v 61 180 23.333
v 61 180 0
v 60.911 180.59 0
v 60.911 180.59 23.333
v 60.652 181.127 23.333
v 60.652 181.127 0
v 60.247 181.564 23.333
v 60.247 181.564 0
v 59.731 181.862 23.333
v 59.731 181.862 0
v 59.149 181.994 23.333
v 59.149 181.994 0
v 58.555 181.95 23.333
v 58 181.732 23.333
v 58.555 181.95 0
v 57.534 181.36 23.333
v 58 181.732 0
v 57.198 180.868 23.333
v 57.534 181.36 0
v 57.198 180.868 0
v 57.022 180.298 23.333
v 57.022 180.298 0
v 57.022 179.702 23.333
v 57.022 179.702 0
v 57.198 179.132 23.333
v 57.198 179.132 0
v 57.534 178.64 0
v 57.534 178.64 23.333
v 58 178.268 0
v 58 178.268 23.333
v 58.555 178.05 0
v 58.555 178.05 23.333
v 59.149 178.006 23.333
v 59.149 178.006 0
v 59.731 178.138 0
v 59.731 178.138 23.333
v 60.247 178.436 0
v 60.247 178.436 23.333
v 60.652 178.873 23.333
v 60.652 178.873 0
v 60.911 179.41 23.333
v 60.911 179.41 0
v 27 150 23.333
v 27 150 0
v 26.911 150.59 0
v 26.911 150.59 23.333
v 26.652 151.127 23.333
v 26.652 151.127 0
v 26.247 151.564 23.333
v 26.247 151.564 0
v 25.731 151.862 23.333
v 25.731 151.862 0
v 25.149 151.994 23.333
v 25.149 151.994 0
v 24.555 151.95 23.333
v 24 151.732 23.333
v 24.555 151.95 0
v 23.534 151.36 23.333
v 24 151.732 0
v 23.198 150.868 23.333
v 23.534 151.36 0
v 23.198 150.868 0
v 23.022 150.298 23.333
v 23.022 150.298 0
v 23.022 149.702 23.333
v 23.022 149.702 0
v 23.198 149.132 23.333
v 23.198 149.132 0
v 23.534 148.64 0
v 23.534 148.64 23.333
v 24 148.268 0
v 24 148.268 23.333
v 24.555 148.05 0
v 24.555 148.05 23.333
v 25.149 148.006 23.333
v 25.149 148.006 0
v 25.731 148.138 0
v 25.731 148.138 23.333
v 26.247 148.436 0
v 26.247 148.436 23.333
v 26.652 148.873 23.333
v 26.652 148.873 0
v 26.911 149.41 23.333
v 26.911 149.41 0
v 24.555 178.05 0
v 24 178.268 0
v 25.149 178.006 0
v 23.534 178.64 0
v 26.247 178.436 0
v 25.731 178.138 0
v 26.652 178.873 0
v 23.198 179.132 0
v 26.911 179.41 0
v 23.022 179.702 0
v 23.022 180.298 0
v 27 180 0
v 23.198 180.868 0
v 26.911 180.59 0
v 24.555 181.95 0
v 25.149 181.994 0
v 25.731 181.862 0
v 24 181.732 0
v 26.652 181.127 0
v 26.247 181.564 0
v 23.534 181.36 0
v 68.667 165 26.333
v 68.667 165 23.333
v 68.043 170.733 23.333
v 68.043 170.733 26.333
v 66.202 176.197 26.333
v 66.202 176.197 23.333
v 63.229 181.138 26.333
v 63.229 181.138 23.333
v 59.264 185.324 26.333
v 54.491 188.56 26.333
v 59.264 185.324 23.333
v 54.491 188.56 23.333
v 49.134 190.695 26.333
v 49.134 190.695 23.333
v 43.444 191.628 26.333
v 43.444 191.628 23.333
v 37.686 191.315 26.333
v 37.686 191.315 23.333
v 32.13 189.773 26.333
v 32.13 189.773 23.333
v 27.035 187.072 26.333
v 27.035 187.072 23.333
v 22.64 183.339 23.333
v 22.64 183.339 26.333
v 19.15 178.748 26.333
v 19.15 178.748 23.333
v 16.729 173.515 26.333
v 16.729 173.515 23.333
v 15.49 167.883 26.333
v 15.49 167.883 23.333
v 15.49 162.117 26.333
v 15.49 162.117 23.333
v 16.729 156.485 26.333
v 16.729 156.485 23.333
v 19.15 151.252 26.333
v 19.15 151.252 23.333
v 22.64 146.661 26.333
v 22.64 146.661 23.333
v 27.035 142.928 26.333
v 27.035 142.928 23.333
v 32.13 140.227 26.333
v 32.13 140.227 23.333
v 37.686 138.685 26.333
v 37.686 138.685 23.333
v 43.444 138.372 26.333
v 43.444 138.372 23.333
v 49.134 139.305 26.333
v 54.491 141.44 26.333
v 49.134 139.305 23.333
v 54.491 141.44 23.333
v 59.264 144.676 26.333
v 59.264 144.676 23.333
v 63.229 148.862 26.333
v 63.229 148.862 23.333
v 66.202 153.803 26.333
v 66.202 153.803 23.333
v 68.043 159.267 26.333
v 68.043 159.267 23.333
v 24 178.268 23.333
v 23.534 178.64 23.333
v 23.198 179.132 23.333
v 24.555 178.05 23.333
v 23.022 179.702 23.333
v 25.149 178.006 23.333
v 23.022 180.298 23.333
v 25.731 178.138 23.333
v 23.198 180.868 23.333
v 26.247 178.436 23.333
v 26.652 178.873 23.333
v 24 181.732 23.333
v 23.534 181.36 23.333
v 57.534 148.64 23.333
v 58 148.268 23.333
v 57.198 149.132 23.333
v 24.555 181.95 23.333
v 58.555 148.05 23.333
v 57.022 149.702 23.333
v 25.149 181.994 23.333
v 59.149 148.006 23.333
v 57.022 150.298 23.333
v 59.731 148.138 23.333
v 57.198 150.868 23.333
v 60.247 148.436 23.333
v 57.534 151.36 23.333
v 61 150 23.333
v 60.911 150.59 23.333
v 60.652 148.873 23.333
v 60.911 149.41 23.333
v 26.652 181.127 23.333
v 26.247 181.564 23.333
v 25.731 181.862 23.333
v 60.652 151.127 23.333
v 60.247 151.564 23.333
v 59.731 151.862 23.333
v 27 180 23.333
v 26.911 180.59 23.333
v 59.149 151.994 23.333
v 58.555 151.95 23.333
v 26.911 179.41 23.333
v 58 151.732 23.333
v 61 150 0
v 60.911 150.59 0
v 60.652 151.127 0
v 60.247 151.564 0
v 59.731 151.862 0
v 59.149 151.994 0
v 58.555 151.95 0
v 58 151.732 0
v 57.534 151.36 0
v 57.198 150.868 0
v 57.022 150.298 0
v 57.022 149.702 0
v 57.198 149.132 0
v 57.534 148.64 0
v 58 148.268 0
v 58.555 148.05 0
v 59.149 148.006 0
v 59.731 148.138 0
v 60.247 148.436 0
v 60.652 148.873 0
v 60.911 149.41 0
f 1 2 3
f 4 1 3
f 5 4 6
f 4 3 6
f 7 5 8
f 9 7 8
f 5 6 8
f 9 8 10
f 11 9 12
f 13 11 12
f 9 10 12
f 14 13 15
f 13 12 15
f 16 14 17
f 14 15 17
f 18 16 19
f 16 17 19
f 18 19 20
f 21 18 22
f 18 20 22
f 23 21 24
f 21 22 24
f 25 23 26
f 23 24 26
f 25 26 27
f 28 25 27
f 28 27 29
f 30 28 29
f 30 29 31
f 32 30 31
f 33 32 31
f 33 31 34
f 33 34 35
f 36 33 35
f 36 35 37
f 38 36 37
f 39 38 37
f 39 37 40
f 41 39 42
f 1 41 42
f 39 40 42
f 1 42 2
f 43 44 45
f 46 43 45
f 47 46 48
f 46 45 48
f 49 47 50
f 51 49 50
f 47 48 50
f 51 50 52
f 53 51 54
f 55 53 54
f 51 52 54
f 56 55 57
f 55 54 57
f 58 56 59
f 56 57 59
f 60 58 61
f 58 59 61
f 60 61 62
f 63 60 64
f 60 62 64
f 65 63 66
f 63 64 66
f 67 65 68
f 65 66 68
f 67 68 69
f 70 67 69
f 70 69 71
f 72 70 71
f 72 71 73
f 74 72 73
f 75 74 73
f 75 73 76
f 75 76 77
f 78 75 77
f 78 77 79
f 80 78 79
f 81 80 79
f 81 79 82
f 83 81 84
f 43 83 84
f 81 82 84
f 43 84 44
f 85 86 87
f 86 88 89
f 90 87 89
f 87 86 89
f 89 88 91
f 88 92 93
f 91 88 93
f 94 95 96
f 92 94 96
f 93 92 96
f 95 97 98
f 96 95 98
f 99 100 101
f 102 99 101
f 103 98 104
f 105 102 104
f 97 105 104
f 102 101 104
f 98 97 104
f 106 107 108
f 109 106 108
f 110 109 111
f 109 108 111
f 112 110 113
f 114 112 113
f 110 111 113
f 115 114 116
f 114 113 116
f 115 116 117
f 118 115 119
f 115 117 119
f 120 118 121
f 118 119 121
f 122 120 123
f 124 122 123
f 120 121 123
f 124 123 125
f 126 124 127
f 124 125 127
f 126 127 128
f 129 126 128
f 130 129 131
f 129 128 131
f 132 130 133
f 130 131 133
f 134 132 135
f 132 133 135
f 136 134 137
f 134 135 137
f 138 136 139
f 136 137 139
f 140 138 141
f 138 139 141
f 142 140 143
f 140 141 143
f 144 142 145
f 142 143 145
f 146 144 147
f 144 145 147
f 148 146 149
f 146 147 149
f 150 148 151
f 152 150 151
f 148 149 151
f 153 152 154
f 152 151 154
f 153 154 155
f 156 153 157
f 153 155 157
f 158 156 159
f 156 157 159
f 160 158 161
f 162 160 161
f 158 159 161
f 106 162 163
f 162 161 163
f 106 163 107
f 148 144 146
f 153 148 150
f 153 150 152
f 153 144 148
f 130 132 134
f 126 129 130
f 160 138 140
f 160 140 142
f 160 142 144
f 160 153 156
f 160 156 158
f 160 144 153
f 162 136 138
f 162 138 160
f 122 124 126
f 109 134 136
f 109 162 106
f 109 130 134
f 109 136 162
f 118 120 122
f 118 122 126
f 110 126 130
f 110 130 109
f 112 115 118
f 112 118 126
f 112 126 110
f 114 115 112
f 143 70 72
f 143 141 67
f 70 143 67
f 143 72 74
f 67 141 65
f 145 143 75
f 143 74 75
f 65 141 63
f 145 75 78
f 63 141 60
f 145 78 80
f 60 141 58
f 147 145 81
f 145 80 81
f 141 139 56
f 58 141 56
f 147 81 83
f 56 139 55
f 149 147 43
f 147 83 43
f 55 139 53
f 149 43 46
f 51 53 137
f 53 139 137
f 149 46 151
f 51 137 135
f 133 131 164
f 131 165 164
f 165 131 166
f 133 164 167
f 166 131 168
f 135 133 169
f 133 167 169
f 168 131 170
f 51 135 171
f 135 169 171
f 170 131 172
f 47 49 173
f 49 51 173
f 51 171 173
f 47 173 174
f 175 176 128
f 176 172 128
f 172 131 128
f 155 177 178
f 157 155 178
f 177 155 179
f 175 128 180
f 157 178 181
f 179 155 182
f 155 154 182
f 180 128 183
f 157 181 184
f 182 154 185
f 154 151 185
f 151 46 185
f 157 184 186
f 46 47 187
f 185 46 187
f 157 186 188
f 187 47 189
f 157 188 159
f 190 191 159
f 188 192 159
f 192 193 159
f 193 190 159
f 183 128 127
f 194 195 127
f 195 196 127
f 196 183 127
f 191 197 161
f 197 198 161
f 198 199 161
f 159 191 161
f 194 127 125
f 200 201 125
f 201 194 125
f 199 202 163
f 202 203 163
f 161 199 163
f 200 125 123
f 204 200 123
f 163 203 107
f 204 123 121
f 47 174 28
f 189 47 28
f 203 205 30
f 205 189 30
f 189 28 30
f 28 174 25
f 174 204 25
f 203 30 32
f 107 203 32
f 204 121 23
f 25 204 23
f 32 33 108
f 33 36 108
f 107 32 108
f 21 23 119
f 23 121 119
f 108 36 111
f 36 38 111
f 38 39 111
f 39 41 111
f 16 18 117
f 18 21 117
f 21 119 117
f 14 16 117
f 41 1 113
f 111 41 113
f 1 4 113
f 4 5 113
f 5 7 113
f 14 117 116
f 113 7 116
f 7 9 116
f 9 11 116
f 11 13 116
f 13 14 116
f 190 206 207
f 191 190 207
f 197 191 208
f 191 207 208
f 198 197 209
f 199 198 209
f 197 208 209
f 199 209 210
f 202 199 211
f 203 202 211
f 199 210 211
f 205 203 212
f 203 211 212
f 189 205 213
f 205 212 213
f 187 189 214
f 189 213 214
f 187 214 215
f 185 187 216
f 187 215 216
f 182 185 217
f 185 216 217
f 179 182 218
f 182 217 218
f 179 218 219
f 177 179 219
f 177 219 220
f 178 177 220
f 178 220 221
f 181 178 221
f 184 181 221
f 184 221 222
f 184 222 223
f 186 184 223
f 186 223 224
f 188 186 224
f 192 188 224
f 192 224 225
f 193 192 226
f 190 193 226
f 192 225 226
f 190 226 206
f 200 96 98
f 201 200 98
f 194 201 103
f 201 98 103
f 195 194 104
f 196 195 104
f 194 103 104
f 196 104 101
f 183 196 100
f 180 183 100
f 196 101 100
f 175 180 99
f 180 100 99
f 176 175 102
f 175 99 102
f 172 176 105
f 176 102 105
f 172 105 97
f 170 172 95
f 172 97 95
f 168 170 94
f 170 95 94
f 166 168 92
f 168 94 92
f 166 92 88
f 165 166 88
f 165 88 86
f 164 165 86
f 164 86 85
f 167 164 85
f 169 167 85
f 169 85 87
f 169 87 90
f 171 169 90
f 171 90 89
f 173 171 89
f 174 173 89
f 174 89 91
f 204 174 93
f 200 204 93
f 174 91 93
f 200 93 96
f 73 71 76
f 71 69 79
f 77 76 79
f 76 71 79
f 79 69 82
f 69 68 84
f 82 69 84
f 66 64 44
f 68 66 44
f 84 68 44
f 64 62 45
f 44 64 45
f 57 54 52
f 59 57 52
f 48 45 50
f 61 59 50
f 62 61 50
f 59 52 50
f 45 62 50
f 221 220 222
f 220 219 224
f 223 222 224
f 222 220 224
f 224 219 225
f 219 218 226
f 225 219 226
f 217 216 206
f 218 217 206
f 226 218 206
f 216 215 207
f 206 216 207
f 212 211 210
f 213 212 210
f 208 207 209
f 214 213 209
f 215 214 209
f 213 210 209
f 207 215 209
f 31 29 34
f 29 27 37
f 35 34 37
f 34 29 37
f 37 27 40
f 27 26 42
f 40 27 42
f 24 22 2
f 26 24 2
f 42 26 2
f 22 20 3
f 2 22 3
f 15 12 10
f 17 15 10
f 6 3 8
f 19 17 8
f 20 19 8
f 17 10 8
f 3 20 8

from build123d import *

# Parameters (mm, degrees)
CYLINDER002001007_R     = 2
CYLINDER002001007_DEPTH = 23.3333
ARRAY001_X_COUNT        = 2
ARRAY001_X_PITCH        = 34
ARRAY001_Y_COUNT        = 2
ARRAY001_Y_PITCH        = 30
CYLINDER002001006_R     = 26.6667
CYLINDER002001006_DEPTH = 3


with BuildPart() as matriz_4_patas_mesa_comedor:
    # Cylinder002001007 → Cylinder002001007 (new body)
    with BuildSketch(Plane(origin=(25, 150, 0), x_dir=(1, 0, 0), z_dir=(0, 0, 1))):
        Circle(CYLINDER002001007_R)
    extrude(amount=CYLINDER002001007_DEPTH)

    # Array001 X: matriz 4 patas mesa comedor ×2


with BuildPart() as matriz_4_patas_mesa_comedor_1:
    add(matriz_4_patas_mesa_comedor.part)
    with Locations(*[(i * ARRAY001_X_PITCH, 0, 0) for i in range(1, ARRAY001_X_COUNT)]):
        add(matriz_4_patas_mesa_comedor.part)

    # Array001 Y: matriz 4 patas mesa comedor ×2


with BuildPart() as matriz_4_patas_mesa_comedor_2:
    add(matriz_4_patas_mesa_comedor_1.part)
    with Locations(*[(0, i * ARRAY001_Y_PITCH, 0) for i in range(1, ARRAY001_Y_COUNT)]):
        add(matriz_4_patas_mesa_comedor_1.part)


with BuildPart() as mesa_comedor:
    # Cylinder002001006 → Cylinder002001006 (new body)
    with BuildSketch(Plane(origin=(42, 165, 23.3333), x_dir=(1, 0, 0), z_dir=(0, 0, 1))):
        Circle(CYLINDER002001006_R)
    extrude(amount=CYLINDER002001006_DEPTH)

    # Fusion010: union matriz 4 patas mesa comedor
    add(matriz_4_patas_mesa_comedor_2.part)


solid = mesa_comedor.part
